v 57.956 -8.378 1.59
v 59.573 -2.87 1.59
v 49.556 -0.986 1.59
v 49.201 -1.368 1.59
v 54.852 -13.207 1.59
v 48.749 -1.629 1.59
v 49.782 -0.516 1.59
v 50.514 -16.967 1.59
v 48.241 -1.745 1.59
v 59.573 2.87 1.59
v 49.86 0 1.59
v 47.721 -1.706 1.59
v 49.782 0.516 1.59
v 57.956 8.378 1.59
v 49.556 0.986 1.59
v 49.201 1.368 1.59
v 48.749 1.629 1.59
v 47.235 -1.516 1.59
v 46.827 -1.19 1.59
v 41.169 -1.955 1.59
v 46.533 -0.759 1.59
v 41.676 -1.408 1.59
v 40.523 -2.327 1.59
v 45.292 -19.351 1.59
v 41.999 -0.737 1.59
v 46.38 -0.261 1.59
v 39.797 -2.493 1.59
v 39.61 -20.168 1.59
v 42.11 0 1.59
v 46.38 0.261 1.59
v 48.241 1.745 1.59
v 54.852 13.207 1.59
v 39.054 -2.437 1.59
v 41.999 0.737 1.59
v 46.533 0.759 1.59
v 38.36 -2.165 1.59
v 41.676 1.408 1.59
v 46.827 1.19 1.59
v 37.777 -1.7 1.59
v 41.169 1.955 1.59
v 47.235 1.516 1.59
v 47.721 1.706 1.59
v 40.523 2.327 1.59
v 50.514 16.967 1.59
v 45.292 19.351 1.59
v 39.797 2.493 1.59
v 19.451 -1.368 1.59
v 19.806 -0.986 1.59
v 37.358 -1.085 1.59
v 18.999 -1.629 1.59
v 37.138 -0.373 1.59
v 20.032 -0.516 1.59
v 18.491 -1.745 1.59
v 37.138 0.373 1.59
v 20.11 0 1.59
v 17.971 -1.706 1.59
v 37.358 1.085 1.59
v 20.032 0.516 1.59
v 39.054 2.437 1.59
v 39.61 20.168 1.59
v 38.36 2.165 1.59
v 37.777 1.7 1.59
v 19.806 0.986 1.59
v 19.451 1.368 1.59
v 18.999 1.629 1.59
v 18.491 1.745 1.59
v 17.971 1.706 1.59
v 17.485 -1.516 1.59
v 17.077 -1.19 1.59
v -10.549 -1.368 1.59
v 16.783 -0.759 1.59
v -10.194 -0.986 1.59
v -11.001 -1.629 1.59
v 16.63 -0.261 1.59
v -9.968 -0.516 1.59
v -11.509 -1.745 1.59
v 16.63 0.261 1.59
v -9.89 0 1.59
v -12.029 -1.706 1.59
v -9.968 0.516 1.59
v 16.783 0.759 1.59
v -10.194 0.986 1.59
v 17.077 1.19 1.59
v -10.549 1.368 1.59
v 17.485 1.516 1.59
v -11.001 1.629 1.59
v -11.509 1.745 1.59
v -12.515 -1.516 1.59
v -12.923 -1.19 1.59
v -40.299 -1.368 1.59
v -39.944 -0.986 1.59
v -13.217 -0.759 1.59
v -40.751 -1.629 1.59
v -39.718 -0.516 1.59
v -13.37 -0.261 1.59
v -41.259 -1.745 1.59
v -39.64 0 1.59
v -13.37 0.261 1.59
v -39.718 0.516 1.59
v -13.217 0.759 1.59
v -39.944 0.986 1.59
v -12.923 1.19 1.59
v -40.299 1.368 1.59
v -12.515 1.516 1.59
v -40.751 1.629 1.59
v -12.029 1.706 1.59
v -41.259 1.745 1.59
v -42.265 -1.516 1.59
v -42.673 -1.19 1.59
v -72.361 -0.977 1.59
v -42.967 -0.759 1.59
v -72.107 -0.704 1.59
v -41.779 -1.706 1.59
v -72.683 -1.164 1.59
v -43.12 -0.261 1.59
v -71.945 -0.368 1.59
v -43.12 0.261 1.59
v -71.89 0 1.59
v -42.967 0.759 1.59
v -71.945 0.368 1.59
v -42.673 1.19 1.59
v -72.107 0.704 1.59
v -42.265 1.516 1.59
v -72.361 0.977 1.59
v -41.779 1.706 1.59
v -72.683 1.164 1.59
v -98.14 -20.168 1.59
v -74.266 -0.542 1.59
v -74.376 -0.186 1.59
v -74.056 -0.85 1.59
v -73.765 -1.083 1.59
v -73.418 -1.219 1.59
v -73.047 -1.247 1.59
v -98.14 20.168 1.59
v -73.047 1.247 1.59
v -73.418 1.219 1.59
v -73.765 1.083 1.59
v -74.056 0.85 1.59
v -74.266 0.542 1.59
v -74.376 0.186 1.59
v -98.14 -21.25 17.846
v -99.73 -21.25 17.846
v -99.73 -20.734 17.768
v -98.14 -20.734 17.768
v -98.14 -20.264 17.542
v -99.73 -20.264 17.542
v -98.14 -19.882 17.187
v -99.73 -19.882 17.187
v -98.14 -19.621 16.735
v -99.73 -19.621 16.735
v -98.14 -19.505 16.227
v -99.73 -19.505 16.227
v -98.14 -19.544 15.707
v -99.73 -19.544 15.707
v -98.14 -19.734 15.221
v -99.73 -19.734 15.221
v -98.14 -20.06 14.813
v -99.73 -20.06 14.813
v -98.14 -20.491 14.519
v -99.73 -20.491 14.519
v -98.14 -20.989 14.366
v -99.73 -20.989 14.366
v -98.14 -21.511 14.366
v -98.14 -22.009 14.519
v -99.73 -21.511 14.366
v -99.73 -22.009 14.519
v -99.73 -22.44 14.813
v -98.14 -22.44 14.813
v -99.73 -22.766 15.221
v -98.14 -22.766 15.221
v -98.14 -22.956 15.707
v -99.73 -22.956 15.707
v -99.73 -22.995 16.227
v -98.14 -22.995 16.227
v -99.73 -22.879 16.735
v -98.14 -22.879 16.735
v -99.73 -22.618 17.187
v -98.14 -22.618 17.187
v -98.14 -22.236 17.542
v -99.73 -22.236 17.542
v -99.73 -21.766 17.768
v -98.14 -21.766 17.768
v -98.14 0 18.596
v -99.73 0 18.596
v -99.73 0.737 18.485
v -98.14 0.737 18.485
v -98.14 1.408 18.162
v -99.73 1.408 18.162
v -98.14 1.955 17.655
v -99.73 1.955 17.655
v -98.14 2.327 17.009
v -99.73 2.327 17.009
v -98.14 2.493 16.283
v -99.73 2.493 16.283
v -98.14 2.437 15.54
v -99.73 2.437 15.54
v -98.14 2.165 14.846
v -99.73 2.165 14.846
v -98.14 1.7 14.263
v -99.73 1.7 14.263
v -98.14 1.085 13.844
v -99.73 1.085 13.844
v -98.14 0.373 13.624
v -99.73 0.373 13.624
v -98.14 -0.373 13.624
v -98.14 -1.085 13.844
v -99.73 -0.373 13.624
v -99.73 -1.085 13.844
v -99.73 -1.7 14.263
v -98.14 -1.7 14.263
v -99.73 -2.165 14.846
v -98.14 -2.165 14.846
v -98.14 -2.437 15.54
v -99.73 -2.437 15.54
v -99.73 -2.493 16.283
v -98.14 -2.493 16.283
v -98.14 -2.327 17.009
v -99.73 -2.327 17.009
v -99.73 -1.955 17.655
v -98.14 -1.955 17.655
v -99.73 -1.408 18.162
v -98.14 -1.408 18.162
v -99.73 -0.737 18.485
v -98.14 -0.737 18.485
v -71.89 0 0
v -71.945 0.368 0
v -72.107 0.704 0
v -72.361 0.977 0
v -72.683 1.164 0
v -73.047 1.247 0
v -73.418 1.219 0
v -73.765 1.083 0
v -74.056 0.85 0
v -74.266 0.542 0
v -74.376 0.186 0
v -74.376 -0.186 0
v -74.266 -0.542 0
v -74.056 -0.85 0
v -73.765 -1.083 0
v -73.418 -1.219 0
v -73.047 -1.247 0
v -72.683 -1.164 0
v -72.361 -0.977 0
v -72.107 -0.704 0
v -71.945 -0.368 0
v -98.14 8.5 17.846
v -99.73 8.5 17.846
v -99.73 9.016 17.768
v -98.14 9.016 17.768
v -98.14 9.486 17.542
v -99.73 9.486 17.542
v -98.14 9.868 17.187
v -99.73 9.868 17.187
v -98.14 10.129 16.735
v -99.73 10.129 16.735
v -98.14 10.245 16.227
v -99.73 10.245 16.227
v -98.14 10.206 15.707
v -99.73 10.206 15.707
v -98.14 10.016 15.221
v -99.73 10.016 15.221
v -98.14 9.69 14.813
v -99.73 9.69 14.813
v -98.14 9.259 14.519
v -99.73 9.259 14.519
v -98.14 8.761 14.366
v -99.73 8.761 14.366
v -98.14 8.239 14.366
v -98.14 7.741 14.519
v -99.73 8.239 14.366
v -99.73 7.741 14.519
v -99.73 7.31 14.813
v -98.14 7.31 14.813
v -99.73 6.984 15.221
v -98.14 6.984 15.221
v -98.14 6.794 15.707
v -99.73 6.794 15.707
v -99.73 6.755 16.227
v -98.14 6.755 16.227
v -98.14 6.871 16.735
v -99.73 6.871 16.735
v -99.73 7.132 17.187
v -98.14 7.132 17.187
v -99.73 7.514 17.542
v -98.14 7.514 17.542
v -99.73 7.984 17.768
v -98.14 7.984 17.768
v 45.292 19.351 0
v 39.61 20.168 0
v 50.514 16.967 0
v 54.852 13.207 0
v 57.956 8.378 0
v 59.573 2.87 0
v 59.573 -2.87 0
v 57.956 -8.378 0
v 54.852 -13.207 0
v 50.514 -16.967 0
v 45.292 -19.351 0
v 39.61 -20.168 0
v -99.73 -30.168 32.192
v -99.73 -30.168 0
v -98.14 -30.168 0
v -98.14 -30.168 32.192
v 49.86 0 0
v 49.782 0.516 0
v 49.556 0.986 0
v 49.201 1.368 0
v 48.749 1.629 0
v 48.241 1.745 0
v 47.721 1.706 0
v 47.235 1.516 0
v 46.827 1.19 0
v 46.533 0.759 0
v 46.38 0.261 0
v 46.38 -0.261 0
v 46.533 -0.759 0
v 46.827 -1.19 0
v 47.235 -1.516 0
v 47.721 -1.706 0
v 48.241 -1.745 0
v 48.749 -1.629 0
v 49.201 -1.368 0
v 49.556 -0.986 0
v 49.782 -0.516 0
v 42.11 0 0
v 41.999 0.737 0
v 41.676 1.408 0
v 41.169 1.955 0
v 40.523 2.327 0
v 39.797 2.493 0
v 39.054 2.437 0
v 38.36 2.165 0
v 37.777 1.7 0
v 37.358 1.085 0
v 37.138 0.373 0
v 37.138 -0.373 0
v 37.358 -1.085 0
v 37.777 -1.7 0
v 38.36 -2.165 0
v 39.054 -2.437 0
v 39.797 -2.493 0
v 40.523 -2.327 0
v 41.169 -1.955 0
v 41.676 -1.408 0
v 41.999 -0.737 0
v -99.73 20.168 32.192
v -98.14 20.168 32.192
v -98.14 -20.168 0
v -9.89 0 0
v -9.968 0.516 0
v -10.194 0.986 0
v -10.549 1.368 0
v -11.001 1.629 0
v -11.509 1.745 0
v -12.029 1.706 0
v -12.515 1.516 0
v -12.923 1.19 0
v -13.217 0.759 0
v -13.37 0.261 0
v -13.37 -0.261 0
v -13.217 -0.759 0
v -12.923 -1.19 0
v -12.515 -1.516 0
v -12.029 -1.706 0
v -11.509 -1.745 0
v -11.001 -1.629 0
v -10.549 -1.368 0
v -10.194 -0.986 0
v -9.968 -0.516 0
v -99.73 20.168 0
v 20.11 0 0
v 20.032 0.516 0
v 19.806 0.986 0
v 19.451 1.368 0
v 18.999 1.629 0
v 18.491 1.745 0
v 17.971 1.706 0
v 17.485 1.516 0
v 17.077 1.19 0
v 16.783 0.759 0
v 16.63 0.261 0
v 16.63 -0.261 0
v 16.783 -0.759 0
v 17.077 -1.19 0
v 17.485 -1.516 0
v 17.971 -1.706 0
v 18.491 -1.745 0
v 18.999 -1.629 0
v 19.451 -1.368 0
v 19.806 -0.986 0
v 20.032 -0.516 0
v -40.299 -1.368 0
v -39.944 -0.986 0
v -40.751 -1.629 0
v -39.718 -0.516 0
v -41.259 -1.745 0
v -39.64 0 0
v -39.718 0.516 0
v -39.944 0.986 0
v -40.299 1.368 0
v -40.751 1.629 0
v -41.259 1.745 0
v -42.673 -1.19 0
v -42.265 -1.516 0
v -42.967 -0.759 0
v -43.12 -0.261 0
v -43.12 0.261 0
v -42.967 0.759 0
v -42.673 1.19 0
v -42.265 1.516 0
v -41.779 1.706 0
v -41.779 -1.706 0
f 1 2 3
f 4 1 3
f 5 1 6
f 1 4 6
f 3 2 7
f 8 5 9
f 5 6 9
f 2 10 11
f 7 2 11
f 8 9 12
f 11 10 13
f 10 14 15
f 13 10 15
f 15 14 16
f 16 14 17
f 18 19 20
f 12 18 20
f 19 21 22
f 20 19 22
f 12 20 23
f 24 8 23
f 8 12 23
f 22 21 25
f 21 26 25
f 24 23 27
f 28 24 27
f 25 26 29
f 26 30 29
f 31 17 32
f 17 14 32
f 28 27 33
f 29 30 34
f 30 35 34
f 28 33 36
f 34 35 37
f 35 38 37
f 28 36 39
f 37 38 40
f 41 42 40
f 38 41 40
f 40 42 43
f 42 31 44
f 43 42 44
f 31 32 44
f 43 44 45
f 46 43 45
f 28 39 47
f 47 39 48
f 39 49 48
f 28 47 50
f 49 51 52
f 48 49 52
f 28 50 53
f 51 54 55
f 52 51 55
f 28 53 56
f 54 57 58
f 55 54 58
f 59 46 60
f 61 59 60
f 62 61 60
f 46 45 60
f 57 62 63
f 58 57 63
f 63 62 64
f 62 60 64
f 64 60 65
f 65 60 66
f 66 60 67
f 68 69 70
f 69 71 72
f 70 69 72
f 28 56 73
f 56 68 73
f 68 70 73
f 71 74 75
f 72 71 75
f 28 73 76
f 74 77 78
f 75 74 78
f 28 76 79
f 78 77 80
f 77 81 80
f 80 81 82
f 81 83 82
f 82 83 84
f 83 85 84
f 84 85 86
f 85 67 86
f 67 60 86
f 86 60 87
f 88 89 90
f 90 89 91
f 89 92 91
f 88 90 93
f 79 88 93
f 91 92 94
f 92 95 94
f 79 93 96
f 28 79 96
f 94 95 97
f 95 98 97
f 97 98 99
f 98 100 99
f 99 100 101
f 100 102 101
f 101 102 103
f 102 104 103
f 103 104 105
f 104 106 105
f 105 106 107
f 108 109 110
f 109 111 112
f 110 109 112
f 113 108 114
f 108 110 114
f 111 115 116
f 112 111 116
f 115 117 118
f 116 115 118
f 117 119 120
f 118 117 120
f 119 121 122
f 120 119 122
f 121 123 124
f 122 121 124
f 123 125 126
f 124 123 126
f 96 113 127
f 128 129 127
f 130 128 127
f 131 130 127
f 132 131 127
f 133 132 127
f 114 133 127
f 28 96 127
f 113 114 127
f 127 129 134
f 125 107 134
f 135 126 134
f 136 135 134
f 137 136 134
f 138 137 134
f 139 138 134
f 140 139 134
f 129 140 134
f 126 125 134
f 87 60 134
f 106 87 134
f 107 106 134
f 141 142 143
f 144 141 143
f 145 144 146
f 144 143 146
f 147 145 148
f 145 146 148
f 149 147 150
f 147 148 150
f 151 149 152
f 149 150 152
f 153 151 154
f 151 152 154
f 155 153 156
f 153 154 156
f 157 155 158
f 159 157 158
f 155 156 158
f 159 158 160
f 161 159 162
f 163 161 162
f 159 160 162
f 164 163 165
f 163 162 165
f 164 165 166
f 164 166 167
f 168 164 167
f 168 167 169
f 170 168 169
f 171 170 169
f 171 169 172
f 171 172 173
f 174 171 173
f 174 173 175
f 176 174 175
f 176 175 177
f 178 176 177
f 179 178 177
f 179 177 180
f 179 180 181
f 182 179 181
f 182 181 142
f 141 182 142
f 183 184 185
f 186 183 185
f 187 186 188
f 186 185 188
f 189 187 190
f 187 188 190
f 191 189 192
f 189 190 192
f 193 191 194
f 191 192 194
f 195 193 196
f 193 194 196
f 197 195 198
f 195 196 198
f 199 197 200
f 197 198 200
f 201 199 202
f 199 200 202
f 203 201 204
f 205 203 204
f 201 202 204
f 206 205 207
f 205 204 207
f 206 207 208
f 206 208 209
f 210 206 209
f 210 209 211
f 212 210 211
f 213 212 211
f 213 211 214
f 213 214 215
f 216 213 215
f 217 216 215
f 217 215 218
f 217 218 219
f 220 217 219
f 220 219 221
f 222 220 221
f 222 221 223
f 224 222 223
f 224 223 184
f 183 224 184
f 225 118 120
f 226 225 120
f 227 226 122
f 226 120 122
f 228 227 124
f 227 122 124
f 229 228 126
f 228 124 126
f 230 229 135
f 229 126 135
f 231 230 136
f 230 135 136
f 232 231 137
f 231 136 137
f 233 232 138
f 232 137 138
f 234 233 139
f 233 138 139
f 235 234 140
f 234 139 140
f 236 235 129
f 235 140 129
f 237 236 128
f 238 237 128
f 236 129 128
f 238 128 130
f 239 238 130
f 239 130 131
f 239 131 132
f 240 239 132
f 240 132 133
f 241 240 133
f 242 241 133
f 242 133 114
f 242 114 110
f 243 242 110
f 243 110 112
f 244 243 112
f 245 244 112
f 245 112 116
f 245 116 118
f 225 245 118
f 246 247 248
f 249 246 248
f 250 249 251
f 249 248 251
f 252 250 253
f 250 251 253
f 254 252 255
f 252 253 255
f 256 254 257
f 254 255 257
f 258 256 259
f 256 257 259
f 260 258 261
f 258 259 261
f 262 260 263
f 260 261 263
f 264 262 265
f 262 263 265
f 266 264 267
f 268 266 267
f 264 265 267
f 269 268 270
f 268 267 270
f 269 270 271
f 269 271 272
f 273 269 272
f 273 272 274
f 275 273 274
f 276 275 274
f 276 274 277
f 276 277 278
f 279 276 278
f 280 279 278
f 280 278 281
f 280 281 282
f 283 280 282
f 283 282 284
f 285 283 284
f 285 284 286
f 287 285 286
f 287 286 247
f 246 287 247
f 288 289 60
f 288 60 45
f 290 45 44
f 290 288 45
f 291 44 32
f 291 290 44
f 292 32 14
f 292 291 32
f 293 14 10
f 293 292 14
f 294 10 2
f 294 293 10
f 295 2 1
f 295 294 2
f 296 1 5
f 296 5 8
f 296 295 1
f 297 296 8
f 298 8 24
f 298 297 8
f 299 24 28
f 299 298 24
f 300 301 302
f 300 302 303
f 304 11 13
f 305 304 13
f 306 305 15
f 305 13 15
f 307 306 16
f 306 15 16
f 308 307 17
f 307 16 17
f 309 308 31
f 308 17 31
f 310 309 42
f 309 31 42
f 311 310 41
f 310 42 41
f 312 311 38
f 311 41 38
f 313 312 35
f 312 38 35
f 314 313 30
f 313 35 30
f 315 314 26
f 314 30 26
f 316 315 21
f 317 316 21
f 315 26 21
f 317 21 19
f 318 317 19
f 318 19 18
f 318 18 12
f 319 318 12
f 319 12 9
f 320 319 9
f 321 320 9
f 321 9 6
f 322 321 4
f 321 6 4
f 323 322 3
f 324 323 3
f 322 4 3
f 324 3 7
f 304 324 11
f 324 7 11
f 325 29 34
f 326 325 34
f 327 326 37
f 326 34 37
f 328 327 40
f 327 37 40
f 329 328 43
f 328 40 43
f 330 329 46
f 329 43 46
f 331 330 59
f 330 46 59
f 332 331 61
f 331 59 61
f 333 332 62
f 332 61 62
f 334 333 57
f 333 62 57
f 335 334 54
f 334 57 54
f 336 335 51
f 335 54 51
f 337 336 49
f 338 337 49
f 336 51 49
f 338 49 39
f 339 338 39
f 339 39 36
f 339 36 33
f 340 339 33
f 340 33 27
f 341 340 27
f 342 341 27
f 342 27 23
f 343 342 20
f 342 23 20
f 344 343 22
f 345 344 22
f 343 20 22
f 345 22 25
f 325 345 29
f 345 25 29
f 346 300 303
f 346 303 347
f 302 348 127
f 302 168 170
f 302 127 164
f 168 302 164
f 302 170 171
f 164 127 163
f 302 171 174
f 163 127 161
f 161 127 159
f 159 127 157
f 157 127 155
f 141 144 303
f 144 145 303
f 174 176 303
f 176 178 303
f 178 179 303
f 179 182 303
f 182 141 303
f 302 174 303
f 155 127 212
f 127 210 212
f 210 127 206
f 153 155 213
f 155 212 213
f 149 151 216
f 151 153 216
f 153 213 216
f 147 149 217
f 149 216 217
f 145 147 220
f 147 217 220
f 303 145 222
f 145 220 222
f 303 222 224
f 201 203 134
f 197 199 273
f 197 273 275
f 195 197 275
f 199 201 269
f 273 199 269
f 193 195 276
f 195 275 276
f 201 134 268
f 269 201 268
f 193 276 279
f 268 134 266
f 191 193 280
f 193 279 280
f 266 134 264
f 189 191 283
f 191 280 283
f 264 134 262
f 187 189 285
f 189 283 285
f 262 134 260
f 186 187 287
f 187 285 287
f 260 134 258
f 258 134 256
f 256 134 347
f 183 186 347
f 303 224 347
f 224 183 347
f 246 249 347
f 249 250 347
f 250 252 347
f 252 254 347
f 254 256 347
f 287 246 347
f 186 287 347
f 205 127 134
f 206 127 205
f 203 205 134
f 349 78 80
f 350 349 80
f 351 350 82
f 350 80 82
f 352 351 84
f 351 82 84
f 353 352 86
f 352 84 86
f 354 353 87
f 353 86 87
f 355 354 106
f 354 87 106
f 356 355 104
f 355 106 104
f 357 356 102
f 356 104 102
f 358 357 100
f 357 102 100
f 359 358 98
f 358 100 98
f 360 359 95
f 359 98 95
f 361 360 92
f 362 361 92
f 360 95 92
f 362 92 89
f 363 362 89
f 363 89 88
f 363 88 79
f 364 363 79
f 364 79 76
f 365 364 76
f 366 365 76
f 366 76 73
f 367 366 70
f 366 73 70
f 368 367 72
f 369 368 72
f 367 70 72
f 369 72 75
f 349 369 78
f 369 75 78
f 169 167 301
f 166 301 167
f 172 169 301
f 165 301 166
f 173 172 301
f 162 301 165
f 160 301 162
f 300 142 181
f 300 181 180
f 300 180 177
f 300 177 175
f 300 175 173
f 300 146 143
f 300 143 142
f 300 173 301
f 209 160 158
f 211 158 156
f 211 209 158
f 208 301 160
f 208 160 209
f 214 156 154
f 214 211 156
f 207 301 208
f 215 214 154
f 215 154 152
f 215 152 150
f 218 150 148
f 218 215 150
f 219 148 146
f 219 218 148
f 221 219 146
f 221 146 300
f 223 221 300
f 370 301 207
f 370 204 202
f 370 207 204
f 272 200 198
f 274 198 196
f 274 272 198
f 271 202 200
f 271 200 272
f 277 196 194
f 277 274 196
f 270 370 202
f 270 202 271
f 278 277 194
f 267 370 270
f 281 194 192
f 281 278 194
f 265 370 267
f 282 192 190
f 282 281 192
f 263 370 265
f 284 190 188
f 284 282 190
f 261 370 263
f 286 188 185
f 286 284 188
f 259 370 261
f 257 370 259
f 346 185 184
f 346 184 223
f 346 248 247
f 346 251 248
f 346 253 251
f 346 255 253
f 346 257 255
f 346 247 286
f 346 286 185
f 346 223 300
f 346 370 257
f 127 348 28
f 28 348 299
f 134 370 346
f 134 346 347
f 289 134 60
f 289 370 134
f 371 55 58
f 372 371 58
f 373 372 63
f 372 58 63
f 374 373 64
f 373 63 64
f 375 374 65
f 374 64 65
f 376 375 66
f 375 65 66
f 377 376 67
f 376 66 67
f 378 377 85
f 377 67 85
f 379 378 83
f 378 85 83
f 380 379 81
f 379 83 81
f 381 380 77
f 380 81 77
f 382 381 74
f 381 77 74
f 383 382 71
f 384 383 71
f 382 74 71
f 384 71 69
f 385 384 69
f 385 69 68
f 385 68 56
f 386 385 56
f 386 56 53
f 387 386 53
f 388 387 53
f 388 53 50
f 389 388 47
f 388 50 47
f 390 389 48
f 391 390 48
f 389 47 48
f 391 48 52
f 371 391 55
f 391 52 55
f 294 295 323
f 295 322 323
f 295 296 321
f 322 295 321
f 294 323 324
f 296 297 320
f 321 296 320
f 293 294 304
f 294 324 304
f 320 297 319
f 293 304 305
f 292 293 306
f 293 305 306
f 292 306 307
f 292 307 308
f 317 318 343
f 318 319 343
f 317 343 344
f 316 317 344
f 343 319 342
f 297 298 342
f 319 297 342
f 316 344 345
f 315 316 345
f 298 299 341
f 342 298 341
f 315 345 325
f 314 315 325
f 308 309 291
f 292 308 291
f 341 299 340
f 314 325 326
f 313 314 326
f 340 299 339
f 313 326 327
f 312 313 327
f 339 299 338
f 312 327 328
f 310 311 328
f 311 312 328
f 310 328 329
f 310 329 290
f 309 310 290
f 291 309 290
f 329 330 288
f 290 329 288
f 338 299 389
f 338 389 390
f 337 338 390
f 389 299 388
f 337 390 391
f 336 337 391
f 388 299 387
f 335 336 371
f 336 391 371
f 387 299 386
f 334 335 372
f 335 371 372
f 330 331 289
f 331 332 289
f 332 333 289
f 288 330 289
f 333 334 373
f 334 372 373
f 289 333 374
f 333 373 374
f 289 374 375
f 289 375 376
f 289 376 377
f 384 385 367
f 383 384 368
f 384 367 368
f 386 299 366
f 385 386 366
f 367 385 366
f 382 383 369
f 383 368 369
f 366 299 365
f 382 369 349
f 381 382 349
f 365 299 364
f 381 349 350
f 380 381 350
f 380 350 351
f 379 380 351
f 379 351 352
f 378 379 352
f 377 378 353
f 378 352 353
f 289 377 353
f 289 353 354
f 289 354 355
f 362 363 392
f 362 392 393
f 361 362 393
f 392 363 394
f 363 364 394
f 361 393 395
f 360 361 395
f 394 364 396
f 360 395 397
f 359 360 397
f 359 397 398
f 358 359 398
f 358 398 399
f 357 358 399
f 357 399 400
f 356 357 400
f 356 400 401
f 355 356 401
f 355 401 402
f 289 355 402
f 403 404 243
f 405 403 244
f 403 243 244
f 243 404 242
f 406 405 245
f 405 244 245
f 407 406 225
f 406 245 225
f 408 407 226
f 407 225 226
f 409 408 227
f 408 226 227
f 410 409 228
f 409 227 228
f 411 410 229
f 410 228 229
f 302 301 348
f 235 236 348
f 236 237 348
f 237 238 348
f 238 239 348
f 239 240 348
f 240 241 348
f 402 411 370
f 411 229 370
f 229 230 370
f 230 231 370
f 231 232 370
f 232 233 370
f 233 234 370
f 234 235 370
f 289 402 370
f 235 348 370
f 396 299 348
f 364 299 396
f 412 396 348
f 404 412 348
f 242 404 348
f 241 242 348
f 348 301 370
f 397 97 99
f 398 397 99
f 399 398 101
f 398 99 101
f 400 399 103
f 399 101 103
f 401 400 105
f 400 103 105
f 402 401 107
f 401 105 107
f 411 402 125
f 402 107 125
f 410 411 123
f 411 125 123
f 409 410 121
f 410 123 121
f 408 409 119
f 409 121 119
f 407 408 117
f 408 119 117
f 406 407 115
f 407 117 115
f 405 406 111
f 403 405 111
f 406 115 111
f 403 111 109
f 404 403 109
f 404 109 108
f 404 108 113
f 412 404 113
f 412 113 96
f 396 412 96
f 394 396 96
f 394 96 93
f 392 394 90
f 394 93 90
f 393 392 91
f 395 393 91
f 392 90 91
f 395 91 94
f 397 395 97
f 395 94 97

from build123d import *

# Parameters (mm, degrees)
BOSS_EXTRUDE1_DEPTH = 1.59
SKETCH2_R           = 2.5
SKETCH2_R_2         = 1.75
CUT_EXTRUDE2_DEPTH  = 1.59
SKETCH3_W           = 1.59
SKETCH3_H           = 40.336400608
BOSS_EXTRUDE2_DEPTH = 30.602
SKETCH5_R           = 2.5
SKETCH5_R_2         = 1.75
CUT_EXTRUDE4_DEPTH  = 10
SKETCH6_W           = 32.192
SKETCH6_H           = 10
BOSS_EXTRUDE3_DEPTH = 1.59
SKETCH7_R           = 1.75
CUT_EXTRUDE5_DEPTH  = 10
SKETCH8_R           = 1.25
CUT_EXTRUDE6_DEPTH  = 10


with BuildPart() as part:
    # Sketch1 → Boss-Extrude1 (new body)
    with BuildSketch(Plane.XY):
        with BuildLine():
            Line((-39.610035237, 20.168200304), (39.610035237, 20.168200304))
            ThreePointArc((39.610035237, 20.168200304), (59.77823554, 0), (39.610035237, -20.168200304))
            Line((39.610035237, -20.168200304), (-39.610035237, -20.168200304))
            Line((-39.610035237, -20.168200304), (-99.729964763, -20.168200304))
            Line((-99.729964763, -20.168200304), (-99.729964763, 20.168200304))
            Line((-99.729964763, 20.168200304), (-39.610035237, 20.168200304))
        make_face()
    extrude(amount=BOSS_EXTRUDE1_DEPTH)

    # Sketch2 → Cut-Extrude2 (cut)
    with BuildSketch(Plane.XY.offset(1.59)):
        with Locations((39.610035237, 0)):
            Circle(SKETCH2_R)
        with Locations((48.110035237, 0)):
            Circle(SKETCH2_R_2)
        with Locations((18.360035237, 0)):
            Circle(SKETCH2_R_2)
        with Locations((-11.639964763, 0)):
            Circle(SKETCH2_R_2)
        with Locations((-41.389964763, 0)):
            Circle(SKETCH2_R_2)
    extrude(amount=-CUT_EXTRUDE2_DEPTH, mode=Mode.SUBTRACT)

    # Sketch3 → Boss-Extrude2 (add)
    with BuildSketch(Plane.XY.offset(1.59)):
        with Locations((-98.934964763, 0)):
            Rectangle(SKETCH3_W, SKETCH3_H)
    extrude(amount=BOSS_EXTRUDE2_DEPTH)

    # Sketch5 → Cut-Extrude4 (cut)
    with BuildSketch(Plane.ZY.offset(99.729964763)):
        with Locations((16.096, 0)):
            Circle(SKETCH5_R)
        with Locations((16.096, 8.5)):
            Circle(SKETCH5_R_2)
        with Locations((16.096, -21.25)):
            Circle(SKETCH5_R_2)
    extrude(amount=-CUT_EXTRUDE4_DEPTH, mode=Mode.SUBTRACT)

    # Sketch6 → Boss-Extrude3 (add)
    with BuildSketch(Plane.ZY.offset(99.729964763)):
        with Locations((16.096, -25.168200304)):
            Rectangle(SKETCH6_W, SKETCH6_H)
    extrude(amount=-BOSS_EXTRUDE3_DEPTH)

    # Sketch7 → Cut-Extrude5 (cut)
    with BuildSketch(Plane.ZY.offset(99.729964763)):
        with Locations((16.096, -21.25)):
            Circle(SKETCH7_R)
    extrude(amount=-CUT_EXTRUDE5_DEPTH, mode=Mode.SUBTRACT)

    # Sketch8 → Cut-Extrude6 (cut)
    with BuildSketch(Plane.XY.offset(1.59)):
        with Locations((-73.139964763, 0)):
            Circle(SKETCH8_R)
    extrude(amount=-CUT_EXTRUDE6_DEPTH, mode=Mode.SUBTRACT)


solid = part.part
